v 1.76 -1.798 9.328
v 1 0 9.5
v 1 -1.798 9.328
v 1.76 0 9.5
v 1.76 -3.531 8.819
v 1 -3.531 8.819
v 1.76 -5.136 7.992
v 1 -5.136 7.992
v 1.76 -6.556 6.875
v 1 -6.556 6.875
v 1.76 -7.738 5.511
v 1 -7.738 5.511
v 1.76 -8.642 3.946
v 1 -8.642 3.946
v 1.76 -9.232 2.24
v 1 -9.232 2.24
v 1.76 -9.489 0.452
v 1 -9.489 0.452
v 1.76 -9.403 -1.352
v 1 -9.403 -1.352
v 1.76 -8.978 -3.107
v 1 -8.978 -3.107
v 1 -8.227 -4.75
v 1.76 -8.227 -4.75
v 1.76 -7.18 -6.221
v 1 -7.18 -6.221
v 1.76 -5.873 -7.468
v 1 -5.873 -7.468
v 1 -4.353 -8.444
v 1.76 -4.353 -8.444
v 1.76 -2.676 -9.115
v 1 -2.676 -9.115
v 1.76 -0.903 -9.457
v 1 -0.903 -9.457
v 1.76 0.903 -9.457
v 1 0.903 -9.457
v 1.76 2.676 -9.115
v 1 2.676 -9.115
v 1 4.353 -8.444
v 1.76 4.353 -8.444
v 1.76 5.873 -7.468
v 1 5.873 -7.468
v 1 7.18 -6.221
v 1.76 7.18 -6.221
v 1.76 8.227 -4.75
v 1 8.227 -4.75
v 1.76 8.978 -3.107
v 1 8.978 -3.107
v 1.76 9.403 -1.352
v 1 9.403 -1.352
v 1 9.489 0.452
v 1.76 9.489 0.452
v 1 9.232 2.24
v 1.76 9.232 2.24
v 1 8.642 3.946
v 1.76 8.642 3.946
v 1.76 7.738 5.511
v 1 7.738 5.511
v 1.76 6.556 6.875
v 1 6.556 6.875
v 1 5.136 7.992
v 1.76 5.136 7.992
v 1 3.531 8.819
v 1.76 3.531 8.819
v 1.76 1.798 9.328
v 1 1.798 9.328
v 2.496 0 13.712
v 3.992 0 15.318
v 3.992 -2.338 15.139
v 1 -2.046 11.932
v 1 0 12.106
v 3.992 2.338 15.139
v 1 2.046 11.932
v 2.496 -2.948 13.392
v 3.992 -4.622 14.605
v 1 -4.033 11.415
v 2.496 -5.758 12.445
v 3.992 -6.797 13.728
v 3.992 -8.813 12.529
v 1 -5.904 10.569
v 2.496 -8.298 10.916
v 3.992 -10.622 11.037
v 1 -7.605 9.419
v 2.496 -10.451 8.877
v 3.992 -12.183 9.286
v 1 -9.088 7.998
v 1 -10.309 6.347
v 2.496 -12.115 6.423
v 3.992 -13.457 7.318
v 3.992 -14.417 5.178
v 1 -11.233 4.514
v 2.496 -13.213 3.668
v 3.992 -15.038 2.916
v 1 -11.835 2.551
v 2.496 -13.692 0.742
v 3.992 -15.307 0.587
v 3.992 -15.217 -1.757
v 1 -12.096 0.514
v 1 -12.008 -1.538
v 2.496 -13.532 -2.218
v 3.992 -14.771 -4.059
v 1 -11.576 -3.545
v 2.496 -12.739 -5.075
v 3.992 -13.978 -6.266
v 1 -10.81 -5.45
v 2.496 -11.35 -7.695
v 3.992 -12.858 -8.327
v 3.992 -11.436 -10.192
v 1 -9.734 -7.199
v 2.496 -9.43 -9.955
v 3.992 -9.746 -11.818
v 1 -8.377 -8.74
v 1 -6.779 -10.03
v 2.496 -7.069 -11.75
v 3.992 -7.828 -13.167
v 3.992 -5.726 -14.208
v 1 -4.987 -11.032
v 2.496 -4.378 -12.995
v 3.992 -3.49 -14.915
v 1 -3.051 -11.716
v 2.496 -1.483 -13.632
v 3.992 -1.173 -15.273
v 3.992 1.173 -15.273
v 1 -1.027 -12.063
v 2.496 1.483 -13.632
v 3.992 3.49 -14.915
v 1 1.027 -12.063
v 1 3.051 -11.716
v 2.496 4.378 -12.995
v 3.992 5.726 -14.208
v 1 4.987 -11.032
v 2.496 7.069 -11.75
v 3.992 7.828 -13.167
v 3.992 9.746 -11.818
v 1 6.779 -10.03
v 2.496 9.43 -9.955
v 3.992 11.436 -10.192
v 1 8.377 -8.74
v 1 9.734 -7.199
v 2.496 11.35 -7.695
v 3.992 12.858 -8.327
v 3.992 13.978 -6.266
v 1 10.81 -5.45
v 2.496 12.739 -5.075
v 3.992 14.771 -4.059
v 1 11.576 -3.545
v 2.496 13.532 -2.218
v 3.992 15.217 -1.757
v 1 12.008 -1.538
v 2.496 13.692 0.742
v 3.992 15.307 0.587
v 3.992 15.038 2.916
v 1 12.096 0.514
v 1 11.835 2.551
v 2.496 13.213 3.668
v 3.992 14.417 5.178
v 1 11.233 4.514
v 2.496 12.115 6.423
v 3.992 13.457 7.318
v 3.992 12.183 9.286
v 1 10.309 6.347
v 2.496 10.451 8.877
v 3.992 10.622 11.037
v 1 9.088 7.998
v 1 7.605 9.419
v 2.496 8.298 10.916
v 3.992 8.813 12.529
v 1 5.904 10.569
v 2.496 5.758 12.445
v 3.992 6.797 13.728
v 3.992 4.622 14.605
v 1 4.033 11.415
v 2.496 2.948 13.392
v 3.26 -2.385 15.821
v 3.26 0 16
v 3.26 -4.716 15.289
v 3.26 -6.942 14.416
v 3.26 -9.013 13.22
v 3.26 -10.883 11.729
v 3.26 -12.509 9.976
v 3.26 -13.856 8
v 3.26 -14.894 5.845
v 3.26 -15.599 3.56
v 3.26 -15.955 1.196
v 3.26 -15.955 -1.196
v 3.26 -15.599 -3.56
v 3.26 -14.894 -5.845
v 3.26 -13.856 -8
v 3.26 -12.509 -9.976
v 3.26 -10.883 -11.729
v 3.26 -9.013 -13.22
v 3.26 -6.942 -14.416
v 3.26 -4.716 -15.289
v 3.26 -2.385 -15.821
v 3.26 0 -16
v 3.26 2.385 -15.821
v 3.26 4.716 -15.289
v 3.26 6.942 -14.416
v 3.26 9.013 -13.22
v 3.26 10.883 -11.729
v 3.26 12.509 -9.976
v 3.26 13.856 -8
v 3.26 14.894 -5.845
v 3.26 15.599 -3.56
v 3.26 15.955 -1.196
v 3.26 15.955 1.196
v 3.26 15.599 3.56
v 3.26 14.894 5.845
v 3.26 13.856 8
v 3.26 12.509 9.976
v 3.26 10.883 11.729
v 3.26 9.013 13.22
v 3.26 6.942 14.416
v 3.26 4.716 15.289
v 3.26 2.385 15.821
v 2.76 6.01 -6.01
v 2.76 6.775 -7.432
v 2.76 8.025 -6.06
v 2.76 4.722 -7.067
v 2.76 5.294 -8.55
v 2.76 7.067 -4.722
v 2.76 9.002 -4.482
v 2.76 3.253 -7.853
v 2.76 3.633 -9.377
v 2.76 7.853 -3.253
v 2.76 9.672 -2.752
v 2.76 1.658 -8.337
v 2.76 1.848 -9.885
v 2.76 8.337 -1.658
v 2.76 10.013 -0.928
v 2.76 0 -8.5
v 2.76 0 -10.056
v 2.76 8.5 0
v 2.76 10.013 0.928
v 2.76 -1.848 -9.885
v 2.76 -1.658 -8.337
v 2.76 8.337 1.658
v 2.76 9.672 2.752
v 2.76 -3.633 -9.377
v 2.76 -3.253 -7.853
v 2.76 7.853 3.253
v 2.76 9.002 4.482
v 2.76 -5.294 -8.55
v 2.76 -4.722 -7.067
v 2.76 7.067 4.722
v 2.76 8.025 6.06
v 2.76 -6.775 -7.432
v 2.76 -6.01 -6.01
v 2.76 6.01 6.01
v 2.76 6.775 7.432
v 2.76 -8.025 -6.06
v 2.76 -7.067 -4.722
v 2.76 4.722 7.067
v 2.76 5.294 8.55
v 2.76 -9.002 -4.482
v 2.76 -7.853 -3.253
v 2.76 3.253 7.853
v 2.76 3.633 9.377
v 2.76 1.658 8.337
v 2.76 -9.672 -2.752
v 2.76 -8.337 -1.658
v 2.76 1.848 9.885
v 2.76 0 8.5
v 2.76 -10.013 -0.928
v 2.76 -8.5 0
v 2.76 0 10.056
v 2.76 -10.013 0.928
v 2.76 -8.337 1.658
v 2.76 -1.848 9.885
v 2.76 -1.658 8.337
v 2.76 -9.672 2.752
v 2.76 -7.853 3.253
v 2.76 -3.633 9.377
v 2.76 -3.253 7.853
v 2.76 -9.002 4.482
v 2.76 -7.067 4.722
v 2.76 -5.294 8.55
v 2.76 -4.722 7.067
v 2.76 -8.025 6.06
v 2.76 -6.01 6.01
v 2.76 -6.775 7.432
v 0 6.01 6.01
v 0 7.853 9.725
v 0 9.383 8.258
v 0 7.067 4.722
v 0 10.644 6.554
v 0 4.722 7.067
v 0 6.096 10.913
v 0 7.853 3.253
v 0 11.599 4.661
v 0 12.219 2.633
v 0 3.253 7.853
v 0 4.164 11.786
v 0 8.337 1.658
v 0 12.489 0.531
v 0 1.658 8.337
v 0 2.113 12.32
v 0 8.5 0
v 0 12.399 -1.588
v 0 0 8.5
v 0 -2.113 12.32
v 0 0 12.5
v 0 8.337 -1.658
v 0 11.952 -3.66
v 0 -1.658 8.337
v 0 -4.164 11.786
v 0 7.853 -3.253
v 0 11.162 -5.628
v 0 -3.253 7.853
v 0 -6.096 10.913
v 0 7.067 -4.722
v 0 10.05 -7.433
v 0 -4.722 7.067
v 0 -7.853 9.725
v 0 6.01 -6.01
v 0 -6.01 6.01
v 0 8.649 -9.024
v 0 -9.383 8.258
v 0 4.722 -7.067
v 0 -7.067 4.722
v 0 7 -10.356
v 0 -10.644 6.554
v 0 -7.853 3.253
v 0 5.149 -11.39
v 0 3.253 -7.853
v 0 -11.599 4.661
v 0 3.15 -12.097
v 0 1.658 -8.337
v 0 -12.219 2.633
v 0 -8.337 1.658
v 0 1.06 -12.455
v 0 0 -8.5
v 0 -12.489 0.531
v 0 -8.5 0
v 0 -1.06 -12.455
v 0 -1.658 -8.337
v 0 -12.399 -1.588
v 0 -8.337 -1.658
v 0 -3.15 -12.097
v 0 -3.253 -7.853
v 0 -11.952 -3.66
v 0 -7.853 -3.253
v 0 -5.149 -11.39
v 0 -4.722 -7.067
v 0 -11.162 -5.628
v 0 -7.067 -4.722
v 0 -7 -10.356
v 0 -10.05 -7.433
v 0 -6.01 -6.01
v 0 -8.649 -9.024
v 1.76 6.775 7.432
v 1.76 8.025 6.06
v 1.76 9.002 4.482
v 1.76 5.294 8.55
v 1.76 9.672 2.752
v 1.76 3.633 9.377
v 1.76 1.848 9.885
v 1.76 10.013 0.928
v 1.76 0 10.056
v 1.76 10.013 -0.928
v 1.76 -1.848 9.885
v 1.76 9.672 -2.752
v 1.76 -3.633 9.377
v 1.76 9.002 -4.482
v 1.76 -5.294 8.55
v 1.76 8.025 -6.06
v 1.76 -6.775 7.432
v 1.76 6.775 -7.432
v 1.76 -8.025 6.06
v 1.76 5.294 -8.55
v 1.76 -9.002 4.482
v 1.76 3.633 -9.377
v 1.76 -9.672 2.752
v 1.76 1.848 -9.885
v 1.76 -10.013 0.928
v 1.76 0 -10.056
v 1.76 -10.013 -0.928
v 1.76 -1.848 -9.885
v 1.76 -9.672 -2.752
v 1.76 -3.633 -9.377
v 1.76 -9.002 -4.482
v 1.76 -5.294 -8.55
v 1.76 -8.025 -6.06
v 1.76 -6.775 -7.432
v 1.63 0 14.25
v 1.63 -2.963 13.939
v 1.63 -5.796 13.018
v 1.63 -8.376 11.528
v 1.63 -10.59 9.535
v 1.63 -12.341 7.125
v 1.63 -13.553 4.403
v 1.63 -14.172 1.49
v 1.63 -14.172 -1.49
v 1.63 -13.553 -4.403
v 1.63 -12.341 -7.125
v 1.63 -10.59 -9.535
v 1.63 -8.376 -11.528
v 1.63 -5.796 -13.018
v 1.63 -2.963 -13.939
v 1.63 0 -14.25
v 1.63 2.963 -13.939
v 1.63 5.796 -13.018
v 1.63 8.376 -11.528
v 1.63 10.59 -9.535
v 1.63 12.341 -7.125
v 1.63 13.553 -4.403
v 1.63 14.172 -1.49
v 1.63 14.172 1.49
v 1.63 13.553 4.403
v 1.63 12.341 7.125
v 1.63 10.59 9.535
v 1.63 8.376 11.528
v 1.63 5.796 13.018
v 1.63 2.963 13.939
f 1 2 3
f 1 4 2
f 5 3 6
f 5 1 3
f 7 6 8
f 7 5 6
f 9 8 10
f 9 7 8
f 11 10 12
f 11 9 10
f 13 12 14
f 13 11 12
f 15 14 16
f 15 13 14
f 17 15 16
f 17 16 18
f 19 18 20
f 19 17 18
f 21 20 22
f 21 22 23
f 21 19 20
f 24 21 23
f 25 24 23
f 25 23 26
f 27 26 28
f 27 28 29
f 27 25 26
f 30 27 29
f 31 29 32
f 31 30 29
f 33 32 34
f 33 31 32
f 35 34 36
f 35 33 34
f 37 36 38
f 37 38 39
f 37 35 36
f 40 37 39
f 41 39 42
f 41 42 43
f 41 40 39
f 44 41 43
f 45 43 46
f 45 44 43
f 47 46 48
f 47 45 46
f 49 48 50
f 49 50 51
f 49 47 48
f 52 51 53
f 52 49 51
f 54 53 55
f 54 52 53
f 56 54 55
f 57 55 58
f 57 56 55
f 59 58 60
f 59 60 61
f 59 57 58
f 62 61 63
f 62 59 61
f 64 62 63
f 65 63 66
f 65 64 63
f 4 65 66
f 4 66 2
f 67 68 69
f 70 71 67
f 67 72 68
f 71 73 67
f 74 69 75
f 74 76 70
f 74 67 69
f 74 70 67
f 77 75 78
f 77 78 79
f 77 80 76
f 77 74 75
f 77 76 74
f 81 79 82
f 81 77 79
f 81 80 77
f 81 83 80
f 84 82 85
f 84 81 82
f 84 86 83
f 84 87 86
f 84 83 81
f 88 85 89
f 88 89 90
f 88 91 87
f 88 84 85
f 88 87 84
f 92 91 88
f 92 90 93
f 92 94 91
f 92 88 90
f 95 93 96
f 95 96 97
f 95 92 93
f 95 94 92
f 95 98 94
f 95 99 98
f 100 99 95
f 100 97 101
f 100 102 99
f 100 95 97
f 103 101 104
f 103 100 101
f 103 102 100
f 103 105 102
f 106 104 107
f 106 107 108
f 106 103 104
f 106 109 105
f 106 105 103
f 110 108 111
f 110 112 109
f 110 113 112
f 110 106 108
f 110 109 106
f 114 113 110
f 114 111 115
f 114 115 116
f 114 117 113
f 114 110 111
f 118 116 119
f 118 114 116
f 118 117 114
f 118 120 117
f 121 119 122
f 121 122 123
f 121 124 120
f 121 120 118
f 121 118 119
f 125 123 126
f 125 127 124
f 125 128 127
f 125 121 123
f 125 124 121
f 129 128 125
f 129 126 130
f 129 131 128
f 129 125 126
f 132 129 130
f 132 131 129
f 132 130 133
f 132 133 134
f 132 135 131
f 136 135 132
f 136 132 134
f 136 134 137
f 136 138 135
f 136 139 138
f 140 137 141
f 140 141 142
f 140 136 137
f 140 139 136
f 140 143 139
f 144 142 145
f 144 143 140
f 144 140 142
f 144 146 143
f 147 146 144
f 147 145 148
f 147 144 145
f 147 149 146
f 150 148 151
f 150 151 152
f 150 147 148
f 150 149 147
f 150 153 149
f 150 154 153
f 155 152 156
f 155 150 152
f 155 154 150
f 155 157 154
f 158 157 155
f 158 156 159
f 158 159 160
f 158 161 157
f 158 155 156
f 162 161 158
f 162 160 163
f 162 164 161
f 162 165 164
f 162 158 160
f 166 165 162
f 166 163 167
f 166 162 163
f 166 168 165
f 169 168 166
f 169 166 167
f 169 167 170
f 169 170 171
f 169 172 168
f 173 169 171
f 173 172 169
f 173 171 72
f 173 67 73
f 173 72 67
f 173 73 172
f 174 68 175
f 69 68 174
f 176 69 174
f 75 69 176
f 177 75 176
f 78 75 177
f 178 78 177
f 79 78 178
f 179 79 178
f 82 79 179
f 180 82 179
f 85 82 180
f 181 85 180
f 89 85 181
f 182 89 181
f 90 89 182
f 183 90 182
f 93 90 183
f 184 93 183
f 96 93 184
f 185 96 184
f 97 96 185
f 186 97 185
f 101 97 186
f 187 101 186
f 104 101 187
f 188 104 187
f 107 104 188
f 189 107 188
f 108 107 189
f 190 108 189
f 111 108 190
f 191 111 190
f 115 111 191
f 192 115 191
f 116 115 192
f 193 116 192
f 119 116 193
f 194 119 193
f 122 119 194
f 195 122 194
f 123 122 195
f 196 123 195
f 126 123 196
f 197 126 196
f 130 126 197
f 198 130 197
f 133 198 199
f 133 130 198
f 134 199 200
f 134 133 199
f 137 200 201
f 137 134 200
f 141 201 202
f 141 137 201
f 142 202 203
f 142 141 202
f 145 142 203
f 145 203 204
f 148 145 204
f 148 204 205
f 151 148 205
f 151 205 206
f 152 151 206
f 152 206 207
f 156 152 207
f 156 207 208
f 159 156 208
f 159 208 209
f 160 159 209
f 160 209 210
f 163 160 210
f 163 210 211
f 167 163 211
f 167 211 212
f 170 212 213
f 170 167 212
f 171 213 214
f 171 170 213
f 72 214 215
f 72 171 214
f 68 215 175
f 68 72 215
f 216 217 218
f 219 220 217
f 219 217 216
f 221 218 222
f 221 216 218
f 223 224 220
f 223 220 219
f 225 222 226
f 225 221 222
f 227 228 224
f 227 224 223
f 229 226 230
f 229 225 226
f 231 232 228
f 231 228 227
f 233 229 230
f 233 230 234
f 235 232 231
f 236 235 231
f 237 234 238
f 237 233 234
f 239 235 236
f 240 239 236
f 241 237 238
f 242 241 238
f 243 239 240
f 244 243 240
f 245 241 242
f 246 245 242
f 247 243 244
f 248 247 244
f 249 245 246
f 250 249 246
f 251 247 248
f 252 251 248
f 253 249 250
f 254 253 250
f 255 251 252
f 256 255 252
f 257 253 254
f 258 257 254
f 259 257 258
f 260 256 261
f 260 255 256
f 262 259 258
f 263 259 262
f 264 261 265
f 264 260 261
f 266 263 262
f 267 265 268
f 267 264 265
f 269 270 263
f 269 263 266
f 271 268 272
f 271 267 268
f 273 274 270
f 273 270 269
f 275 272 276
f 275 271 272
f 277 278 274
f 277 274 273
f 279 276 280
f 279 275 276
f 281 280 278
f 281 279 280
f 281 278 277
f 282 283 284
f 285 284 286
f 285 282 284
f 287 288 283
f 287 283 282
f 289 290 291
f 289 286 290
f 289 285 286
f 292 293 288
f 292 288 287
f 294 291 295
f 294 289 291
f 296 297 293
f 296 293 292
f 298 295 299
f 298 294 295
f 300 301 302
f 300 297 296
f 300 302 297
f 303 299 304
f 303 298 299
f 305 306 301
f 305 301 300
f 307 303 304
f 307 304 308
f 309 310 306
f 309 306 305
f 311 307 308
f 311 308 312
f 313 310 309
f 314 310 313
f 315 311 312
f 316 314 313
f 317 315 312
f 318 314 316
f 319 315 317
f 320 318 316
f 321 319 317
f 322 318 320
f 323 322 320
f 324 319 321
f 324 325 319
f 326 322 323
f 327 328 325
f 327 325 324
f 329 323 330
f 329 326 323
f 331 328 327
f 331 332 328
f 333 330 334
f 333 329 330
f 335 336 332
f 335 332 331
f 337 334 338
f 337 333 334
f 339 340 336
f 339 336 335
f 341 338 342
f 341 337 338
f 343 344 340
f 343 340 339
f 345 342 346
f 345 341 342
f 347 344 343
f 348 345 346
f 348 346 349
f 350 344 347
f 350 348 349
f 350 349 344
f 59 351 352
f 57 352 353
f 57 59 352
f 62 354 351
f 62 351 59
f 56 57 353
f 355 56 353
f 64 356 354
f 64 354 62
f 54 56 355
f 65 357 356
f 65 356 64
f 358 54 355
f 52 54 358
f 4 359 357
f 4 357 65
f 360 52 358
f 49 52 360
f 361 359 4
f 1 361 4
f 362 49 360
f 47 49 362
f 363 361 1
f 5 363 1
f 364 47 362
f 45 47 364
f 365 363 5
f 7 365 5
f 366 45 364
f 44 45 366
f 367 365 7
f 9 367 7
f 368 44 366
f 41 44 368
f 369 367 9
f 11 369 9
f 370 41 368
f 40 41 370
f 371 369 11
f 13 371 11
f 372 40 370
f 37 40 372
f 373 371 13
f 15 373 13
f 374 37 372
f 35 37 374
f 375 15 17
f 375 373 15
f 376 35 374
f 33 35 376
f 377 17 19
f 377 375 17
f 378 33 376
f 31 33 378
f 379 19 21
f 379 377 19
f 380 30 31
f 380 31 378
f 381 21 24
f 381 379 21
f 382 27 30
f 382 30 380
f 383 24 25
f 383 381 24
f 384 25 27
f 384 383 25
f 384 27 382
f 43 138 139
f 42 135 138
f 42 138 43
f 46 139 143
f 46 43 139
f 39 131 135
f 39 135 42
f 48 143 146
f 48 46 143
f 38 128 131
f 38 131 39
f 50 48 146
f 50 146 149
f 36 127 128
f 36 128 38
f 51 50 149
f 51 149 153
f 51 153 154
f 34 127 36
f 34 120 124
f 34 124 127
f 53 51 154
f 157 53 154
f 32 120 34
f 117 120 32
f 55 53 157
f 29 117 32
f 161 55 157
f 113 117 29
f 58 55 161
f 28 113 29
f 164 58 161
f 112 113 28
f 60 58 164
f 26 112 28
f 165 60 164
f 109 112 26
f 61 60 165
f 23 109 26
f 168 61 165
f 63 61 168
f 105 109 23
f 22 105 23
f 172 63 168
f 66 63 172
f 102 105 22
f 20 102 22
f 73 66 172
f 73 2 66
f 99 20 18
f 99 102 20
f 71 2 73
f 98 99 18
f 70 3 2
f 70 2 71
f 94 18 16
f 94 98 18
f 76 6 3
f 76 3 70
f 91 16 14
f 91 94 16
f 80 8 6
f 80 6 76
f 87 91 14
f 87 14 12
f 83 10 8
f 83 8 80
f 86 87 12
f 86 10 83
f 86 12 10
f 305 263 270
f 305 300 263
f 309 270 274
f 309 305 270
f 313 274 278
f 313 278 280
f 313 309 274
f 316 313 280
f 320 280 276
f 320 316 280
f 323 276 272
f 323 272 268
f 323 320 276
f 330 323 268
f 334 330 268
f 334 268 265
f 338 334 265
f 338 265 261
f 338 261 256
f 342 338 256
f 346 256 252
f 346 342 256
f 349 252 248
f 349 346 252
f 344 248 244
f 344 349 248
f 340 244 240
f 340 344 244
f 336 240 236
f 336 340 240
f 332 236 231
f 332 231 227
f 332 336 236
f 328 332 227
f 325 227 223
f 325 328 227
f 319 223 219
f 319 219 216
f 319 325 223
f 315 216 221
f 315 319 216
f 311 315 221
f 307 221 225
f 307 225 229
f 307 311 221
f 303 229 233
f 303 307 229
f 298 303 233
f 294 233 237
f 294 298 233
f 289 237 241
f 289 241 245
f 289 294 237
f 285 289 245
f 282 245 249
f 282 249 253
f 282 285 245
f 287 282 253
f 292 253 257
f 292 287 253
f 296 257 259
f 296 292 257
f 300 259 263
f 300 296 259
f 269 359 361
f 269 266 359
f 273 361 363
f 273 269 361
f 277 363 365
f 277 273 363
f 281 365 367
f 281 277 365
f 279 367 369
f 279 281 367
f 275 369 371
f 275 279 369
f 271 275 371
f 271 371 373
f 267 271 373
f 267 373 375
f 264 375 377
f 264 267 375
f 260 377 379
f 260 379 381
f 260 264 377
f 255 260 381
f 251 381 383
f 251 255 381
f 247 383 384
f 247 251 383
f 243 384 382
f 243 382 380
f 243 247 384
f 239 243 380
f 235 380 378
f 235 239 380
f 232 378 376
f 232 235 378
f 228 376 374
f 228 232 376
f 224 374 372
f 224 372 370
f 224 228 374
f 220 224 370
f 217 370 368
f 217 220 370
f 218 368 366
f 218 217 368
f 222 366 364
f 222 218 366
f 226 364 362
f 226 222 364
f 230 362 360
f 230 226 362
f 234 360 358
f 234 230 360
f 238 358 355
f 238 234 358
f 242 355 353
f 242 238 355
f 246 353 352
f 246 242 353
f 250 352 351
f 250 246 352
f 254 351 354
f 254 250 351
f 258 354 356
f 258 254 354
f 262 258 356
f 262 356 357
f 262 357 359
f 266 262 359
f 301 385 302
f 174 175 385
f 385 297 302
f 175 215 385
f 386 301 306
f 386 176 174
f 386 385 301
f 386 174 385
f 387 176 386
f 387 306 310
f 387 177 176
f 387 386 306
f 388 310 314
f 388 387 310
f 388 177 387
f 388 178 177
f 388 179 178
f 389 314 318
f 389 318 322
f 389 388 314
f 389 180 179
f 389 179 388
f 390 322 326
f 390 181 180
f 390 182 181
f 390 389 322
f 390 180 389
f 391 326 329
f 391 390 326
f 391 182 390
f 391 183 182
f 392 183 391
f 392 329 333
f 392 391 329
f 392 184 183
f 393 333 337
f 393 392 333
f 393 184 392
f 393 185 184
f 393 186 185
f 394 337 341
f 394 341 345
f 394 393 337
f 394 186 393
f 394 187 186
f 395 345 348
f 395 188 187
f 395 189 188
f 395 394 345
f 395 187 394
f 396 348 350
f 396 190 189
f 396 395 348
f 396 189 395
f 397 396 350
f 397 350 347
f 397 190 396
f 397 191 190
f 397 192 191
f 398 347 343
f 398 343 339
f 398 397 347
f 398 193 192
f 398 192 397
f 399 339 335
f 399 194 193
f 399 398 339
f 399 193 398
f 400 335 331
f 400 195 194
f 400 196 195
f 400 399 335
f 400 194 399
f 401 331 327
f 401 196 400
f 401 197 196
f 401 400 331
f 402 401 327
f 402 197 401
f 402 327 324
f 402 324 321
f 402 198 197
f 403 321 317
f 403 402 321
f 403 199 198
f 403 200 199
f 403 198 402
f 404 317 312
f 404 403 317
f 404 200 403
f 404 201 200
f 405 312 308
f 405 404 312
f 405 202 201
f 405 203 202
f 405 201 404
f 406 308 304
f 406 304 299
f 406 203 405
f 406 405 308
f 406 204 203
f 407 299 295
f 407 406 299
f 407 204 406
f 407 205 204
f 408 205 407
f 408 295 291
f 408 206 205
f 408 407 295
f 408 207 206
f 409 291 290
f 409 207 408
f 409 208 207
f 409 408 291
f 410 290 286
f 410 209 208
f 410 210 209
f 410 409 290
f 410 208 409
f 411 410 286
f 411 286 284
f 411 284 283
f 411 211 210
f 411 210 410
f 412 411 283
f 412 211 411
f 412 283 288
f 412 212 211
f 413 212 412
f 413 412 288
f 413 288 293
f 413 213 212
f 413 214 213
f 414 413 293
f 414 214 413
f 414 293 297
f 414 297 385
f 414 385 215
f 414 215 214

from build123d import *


with BuildPart() as part:
    # Esquisse1 → Révol.-Mince2 (revolve)
    with BuildSketch(Plane.XY, mode=Mode.PRIVATE) as r_vol_mince2_sk:
        Polygon((2.76, 10.056278032), (2.76, 8.5), (0, 8.5), (0, 12.5), (3.26, 16), (3.991750138, 15.318427014), (1, 12.106425332), (1, 9.5), (1.76, 9.5), (1.76, 10.056278032), align=None)
    revolve(r_vol_mince2_sk.sketch.rotate(Axis((-7.892655367, 0, 0), (1, 0, 0)), 90), axis=Axis((-7.892655367, 0, 0), (1, 0, 0)))


solid = part.part
